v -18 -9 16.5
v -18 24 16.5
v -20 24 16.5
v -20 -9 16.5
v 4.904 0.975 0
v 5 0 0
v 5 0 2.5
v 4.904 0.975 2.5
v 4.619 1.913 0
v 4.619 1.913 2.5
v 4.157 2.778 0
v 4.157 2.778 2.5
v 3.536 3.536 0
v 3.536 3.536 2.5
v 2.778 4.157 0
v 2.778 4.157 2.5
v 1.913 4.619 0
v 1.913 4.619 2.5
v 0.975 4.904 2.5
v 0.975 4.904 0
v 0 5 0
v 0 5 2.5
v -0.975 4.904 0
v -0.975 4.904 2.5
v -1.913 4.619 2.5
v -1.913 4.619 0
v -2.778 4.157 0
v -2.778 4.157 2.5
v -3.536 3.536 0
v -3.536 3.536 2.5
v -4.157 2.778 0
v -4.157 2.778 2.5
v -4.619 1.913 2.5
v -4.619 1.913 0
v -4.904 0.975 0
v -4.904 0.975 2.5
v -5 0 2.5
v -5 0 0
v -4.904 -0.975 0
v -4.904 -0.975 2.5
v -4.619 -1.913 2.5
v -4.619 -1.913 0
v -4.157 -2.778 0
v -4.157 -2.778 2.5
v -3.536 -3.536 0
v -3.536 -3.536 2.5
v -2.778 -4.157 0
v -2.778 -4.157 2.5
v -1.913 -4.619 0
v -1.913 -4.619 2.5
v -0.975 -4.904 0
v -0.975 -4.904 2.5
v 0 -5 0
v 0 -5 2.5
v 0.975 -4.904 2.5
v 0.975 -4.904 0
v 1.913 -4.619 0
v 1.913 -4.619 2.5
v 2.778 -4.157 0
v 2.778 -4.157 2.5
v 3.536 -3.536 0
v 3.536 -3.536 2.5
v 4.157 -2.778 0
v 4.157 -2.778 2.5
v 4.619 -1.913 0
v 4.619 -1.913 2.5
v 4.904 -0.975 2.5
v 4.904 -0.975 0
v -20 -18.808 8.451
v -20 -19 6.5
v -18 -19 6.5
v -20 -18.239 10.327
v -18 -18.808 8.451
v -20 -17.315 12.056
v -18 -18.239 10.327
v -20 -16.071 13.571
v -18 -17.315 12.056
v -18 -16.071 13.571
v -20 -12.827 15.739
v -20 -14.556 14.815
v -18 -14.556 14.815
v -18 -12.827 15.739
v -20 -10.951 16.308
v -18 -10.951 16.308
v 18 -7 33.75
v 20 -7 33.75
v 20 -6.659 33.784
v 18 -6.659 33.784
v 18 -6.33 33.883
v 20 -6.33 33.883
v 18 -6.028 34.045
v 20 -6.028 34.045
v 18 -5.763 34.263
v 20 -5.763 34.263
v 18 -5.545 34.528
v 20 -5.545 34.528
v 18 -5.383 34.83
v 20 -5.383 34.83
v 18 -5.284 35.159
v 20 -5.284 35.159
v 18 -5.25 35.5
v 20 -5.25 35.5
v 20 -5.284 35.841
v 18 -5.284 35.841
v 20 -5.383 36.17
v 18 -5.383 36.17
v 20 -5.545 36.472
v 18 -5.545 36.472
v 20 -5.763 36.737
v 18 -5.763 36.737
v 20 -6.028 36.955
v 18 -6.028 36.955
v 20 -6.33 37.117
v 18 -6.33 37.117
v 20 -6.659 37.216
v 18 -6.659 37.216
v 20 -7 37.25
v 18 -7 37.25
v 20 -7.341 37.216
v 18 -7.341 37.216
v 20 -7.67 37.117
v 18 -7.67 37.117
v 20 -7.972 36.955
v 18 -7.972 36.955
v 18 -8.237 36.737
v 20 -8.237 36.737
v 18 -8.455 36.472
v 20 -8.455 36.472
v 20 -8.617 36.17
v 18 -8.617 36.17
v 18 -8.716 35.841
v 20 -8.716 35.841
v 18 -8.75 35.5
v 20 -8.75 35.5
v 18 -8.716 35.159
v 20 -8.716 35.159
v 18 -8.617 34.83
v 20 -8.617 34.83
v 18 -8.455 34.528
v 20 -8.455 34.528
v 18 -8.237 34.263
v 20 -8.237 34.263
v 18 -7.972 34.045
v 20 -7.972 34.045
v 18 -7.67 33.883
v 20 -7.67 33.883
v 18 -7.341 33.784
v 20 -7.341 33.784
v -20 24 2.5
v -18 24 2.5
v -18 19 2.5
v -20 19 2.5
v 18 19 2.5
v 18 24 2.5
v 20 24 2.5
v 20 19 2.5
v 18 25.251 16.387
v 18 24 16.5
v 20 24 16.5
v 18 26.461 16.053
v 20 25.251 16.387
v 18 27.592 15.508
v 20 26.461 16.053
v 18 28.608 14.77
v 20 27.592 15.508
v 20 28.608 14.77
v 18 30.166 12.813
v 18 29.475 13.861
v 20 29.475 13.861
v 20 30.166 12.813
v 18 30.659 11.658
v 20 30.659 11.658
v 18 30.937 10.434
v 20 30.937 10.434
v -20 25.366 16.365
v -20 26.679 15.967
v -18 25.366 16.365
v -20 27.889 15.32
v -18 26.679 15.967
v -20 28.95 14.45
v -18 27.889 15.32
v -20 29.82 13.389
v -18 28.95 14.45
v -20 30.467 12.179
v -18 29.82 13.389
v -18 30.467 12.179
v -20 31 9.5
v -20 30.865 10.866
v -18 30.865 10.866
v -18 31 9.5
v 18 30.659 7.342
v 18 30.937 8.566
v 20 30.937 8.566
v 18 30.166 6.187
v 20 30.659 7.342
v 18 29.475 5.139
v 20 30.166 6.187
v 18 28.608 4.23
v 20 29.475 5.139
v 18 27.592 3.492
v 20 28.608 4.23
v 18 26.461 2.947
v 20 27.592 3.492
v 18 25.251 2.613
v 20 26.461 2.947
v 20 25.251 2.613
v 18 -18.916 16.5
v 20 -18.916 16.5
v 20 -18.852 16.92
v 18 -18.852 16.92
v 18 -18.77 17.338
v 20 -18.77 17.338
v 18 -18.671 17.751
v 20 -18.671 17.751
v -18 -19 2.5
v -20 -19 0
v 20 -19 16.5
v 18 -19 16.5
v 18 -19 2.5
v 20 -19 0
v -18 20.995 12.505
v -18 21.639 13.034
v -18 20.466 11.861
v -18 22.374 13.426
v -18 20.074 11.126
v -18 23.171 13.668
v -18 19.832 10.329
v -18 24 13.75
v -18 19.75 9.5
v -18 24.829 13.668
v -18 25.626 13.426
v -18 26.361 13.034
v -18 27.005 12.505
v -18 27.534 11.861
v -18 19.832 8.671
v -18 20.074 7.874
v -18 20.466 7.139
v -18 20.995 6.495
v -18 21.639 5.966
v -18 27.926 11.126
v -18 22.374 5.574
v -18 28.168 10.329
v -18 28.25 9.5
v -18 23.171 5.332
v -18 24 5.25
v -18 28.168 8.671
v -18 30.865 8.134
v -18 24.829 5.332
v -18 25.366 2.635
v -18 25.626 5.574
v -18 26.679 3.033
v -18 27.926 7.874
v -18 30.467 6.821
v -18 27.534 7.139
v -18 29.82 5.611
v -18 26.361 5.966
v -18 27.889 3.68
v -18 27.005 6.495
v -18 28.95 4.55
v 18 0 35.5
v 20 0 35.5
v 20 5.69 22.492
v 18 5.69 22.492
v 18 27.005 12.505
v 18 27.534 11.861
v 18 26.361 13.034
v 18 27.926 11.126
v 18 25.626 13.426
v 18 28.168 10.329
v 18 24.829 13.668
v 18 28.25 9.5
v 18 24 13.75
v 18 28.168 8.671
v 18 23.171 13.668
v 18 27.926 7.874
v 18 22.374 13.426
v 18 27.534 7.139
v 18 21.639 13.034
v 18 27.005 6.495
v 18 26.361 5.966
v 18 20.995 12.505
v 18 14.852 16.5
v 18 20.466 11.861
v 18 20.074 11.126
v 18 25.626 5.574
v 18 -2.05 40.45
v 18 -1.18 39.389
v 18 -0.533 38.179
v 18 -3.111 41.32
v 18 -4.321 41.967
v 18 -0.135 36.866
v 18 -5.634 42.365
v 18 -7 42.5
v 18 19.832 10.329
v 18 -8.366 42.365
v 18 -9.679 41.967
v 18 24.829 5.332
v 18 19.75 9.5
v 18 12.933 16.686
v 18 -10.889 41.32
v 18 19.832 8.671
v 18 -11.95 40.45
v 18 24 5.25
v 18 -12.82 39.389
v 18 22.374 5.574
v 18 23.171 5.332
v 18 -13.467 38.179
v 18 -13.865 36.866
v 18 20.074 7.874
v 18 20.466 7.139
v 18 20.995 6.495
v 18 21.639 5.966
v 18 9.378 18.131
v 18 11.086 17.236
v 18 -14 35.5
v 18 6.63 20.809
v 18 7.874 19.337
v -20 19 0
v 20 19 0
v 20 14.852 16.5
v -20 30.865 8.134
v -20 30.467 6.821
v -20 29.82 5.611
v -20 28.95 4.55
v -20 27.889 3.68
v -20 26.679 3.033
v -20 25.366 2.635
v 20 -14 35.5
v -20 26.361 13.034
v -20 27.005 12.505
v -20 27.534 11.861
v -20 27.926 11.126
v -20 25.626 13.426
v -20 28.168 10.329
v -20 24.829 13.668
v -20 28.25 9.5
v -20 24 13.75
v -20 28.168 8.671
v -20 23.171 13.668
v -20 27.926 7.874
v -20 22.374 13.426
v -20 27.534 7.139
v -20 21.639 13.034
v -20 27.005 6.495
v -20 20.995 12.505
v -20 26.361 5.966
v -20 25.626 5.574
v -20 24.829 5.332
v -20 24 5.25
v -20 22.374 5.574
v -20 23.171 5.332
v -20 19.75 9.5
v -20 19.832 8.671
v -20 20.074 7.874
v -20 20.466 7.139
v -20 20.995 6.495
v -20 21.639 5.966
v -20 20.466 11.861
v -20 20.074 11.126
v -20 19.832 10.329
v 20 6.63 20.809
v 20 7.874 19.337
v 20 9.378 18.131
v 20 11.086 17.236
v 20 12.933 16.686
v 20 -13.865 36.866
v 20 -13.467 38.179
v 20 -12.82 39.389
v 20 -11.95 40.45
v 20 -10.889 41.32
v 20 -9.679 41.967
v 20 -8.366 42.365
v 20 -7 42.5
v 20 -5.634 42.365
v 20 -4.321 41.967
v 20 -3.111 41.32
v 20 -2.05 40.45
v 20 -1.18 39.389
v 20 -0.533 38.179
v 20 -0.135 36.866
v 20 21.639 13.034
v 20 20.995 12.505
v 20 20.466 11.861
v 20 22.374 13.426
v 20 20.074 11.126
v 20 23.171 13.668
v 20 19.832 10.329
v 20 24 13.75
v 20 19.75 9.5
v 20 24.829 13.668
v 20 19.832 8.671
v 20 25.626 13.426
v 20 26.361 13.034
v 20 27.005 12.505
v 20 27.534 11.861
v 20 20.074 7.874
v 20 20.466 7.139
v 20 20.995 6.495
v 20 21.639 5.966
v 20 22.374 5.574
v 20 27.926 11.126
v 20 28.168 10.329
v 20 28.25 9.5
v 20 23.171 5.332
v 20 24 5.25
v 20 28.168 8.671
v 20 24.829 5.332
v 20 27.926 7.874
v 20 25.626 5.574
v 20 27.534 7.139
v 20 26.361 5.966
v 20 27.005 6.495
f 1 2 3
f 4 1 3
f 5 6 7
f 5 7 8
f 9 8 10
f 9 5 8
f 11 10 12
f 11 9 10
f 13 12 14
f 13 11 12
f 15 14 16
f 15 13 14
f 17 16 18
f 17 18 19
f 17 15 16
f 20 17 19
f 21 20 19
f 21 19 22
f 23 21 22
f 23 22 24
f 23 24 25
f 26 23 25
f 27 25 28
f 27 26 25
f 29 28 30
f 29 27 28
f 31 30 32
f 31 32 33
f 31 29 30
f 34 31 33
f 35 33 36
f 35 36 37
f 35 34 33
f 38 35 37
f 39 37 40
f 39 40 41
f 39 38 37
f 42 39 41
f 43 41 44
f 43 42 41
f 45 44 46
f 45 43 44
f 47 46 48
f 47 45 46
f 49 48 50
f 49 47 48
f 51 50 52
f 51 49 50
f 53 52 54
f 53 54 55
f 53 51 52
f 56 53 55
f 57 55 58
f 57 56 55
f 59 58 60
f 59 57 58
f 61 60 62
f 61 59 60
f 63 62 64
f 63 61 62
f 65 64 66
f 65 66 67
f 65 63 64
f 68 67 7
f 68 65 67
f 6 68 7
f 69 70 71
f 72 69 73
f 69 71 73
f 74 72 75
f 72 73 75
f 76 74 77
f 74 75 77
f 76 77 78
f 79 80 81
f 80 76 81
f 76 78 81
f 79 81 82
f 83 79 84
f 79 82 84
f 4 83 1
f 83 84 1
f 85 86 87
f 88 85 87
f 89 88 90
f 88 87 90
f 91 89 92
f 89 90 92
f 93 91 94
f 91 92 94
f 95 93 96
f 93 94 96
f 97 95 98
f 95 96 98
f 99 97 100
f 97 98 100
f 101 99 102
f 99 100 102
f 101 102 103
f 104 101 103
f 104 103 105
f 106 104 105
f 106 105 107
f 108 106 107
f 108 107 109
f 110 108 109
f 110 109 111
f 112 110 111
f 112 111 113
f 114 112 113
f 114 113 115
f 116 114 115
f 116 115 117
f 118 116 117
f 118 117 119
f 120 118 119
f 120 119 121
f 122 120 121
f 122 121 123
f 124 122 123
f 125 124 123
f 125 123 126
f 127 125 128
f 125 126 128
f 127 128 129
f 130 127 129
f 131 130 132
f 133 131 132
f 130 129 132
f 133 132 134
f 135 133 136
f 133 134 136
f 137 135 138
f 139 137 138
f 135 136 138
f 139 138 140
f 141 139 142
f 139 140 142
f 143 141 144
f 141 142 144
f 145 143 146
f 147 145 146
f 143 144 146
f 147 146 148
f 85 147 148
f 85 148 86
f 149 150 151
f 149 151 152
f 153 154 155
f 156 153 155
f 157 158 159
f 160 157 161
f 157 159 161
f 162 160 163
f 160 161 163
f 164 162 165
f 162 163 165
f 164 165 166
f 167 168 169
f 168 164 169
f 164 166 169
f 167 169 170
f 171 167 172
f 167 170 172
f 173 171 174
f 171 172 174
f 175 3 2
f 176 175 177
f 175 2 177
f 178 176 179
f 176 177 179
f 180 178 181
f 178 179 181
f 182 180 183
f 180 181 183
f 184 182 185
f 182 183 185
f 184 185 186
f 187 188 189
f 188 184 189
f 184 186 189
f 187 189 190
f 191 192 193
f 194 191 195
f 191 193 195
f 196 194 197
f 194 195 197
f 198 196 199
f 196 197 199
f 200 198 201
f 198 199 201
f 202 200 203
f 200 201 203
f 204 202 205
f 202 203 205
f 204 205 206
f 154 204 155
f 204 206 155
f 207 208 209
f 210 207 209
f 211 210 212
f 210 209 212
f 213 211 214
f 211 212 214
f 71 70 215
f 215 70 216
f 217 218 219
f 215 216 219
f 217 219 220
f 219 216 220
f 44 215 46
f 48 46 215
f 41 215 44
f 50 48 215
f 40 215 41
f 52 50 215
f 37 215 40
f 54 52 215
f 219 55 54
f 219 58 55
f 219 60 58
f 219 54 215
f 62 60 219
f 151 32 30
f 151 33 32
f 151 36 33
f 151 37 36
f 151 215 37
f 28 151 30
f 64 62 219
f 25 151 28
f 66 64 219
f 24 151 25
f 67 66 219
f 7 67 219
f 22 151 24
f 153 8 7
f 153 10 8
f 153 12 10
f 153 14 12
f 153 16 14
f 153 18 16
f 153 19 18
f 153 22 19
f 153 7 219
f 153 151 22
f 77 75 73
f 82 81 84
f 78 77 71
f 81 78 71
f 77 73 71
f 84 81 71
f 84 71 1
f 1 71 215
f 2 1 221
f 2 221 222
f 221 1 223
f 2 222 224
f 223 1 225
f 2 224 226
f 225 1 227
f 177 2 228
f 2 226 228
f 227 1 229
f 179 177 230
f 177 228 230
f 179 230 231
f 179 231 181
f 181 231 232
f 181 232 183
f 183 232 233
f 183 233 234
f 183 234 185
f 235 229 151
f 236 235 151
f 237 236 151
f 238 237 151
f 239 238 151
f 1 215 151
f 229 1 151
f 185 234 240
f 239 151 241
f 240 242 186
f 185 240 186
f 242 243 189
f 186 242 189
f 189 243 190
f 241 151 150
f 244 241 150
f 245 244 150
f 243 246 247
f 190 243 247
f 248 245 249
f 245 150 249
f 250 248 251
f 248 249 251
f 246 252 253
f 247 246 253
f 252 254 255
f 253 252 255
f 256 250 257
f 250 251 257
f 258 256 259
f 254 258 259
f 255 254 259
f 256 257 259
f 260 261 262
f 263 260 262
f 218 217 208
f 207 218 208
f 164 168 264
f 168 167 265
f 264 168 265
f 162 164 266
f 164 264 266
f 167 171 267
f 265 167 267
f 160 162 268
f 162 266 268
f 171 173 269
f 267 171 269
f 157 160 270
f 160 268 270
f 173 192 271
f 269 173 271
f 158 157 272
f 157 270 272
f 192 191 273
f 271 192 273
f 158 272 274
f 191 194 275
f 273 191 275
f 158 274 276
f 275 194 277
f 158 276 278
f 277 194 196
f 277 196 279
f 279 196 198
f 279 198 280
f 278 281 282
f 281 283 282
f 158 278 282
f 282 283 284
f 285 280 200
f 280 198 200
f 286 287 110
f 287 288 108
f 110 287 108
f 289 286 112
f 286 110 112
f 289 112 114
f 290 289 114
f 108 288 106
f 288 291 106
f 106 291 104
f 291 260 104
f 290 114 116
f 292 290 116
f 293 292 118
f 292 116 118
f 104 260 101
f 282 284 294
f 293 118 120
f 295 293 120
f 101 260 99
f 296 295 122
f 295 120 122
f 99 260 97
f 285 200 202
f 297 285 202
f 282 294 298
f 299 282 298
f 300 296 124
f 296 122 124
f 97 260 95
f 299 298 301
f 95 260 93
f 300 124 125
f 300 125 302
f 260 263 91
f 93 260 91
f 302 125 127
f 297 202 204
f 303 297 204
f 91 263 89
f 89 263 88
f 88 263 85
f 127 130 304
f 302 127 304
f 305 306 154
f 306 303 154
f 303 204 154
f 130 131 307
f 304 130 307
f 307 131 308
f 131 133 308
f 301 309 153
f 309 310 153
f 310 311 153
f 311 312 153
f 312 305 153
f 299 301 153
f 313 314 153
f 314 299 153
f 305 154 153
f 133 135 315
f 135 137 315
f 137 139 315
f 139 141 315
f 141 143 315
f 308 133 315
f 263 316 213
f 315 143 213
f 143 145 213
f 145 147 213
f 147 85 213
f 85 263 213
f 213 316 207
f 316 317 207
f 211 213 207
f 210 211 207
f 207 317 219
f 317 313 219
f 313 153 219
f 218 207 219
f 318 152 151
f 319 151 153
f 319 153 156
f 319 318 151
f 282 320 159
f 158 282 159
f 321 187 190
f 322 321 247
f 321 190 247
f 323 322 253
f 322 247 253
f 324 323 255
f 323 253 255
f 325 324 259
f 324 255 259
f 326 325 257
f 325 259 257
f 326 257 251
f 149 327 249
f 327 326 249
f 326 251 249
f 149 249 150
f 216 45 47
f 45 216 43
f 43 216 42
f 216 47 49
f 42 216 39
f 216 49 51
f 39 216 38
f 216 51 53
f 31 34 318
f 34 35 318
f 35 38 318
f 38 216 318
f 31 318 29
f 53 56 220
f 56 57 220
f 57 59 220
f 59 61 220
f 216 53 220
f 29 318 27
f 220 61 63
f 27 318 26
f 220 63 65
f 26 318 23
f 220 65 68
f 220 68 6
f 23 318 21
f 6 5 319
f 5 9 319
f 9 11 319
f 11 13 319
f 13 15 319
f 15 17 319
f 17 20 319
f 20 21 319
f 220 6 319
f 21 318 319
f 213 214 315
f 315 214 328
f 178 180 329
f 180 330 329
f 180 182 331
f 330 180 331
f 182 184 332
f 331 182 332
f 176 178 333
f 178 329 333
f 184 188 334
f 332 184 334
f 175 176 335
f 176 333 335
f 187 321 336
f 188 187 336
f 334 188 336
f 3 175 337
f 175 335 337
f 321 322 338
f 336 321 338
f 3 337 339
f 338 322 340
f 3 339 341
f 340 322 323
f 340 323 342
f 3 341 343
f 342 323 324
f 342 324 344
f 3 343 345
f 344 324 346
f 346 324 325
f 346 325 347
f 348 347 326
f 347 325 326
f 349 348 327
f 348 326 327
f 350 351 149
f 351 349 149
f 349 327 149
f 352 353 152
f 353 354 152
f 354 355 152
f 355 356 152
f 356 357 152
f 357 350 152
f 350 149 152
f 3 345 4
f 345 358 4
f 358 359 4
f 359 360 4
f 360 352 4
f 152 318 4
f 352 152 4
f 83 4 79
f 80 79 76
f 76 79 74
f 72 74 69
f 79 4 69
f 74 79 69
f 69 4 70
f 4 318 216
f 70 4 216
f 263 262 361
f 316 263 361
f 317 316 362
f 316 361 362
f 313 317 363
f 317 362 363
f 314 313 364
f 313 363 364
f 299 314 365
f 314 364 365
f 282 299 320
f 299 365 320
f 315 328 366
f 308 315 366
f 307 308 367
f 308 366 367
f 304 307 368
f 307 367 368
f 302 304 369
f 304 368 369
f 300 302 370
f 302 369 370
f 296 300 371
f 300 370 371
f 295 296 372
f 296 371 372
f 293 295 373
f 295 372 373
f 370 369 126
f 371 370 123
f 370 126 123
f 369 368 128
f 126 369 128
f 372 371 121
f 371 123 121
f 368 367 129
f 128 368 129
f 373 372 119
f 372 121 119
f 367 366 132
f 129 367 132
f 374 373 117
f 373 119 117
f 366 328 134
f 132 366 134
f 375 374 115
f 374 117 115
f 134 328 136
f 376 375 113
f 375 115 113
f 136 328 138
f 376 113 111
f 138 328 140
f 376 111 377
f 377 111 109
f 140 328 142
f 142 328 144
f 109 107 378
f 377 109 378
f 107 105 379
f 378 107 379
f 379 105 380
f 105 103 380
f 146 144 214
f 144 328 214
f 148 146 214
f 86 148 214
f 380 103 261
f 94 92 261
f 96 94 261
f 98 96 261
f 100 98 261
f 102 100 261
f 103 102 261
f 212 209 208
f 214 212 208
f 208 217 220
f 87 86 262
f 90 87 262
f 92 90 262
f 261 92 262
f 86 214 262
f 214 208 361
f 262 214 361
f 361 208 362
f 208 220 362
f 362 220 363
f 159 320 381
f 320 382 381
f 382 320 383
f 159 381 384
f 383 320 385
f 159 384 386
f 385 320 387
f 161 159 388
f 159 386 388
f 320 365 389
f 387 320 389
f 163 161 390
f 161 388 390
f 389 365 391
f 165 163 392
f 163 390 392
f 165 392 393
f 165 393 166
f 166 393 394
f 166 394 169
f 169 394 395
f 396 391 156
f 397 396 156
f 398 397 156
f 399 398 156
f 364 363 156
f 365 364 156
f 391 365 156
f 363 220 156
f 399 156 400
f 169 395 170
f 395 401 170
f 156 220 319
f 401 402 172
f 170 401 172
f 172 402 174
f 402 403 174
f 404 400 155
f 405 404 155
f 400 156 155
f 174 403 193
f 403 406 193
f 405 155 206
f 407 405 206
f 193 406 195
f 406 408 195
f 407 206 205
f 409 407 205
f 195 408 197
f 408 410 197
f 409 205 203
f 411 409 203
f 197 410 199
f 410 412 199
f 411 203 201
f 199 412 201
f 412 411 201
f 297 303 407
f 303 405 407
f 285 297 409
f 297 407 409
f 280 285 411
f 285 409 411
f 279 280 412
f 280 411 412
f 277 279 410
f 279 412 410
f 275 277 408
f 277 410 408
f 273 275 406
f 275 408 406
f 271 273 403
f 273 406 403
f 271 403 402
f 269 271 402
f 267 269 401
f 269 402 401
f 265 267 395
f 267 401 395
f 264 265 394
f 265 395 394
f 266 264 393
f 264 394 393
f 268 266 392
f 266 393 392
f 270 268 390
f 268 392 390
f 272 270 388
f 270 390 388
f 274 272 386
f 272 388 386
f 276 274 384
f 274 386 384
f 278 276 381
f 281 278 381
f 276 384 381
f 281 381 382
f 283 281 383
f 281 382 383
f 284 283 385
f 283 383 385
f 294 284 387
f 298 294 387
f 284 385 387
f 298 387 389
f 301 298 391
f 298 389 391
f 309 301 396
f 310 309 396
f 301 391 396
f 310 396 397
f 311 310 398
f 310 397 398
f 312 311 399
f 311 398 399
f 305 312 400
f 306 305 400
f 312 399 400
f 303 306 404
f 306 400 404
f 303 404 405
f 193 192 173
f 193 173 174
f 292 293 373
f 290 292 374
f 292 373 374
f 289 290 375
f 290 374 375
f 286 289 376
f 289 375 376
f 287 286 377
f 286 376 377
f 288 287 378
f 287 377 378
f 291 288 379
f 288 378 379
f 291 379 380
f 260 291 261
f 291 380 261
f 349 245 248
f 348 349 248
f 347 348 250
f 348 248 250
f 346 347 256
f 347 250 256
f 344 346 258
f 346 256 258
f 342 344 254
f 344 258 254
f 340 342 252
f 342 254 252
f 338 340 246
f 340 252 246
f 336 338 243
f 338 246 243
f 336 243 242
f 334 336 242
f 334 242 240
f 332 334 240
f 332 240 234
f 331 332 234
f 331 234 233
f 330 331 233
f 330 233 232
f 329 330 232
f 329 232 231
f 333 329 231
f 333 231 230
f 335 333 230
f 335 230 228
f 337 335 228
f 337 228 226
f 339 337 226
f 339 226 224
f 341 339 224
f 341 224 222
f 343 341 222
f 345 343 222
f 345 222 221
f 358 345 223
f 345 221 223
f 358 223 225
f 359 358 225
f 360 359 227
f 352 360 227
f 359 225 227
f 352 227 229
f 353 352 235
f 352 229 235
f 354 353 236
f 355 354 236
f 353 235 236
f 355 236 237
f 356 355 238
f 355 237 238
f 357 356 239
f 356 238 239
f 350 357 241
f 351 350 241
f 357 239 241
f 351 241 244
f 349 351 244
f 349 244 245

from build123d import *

# Parameters (mm, degrees)
SKETCH_1_W          = 40
SKETCH_1_H          = 38
SKETCH_1_R          = 5
EXTRUDE_1_DEPTH     = 2.5
EXTRUDE_2_DEPTH     = 14
SKETCH_3_R          = 4.25
CUT_EXTRUDE_2_DEPTH = 3
SKETCH_4_W          = 2
SKETCH_4_H          = 11.937460889
SKETCH_4_H_2        = 38
EXTRUDE_3_DEPTH     = 40
CUT_EXTRUDE_3_REACH = 42
SKETCH_5_R          = 1.75
SKETCH_5_R_2        = 4.25


with BuildPart() as part:
    # 草图1 → 凸台-拉伸1 (new body)
    with BuildSketch(Plane.XY):
        Rectangle(SKETCH_1_W, SKETCH_1_H)
        Circle(SKETCH_1_R, mode=Mode.SUBTRACT)
    extrude(amount=EXTRUDE_1_DEPTH)

    # 草图2 → 凸台-拉伸2 (add)
    with BuildSketch(Plane.XY.offset(2.5)):
        Polygon((-18, 19), (-18, -19), (-20, -19), (-20, 19), (-20, 31), (-18, 31), align=None)
    extrude(amount=EXTRUDE_2_DEPTH)

    # 草图3 → 切除-拉伸2 (cut, through all)
    with BuildSketch(Plane(origin=(-18, 0, 0), x_dir=(0, 0, -1), z_dir=(1, 0, 0))):
        with BuildLine():
            Line((-16.5, -19), (-6.5, -19))
            ThreePointArc((-6.5, -19), (-13.571067812, -16.071067812), (-16.5, -9))
            Line((-16.5, -9), (-16.5, -19))
        make_face()
        with BuildLine():
            Line((-16.5, 31), (-16.5, 24))
            ThreePointArc((-16.5, 24), (-14.449747468, 28.949747468), (-9.5, 31))
            Line((-9.5, 31), (-16.5, 31))
        make_face()
        with BuildLine():
            ThreePointArc((-9.5, 31), (-4.550252532, 28.949747468), (-2.5, 24))
            Line((-2.5, 24), (-2.5, 31))
            Line((-2.5, 31), (-9.5, 31))
        make_face()
        with Locations((-9.5, 24)):
            Circle(SKETCH_3_R)
    extrude(amount=-CUT_EXTRUDE_2_DEPTH, mode=Mode.SUBTRACT)

    # 草图4 → 凸台-拉伸3 (add)
    with BuildSketch(Plane.XY.offset(2.5)):
        with Locations((19, 24.968730445)):
            Rectangle(SKETCH_4_W, SKETCH_4_H)
        with Locations((19, 0)):
            Rectangle(SKETCH_4_W, SKETCH_4_H_2)
    extrude(amount=EXTRUDE_3_DEPTH)

    # 草图5 → 切除-拉伸3 (cut, up to next)
    with BuildSketch(Plane(origin=(20, 0, 0), x_dir=(0, 0, -1), z_dir=(1, 0, 0)), mode=Mode.PRIVATE) as cut_extrude_3_sk1:
        with BuildLine():
            ThreePointArc((-35.5, -14), (-40.449747452, -11.949747484), (-42.5, -7.000000045))
            Line((-42.5, -7.000000045), (-42.5, -19))
            Line((-42.5, -19), (-16.5, -19))
            Line((-16.5, -19), (-16.5, -18.915955378))
            ThreePointArc((-16.5, -18.915955378), (-17.129495713, -18.813310688), (-17.751167584, -18.670745373))
            Line((-17.751167584, -18.670745373), (-35.5, -14))
        make_face()
    cut_extrude_3_tool1 = extrude(cut_extrude_3_sk1.sketch, amount=-CUT_EXTRUDE_3_REACH, mode=Mode.PRIVATE) & part.part
    add(cut_extrude_3_tool1.solids().sort_by_distance((20, -16.467085, 34.190758))[0], mode=Mode.SUBTRACT)
    # 草图5 → 切除-拉伸3 (cut, up to next)
    with BuildSketch(Plane(origin=(20, 0, 0), x_dir=(0, 0, -1), z_dir=(1, 0, 0)), mode=Mode.PRIVATE) as cut_extrude_3_sk2:
        with BuildLine():
            ThreePointArc((-16.5, 24), (-14.769502014, 28.60785726), (-10.433614706, 30.937460889))
            Line((-10.433614706, 30.937460889), (-42.5, 30.937460889))
            Line((-42.5, 30.937460889), (-42.5, -7.000000045))
            ThreePointArc((-42.5, -7.000000045), (-40.449747484, -2.050252548), (-35.5, 0))
            Line((-35.5, 0), (-22.492126933, 5.690411164))
            ThreePointArc((-22.492126933, 5.690411164), (-18.131047537, 9.37849159), (-16.5, 14.852122439))
            Line((-16.5, 14.852122439), (-16.5, 24))
        make_face()
    cut_extrude_3_tool2 = extrude(cut_extrude_3_sk2.sketch, amount=-CUT_EXTRUDE_3_REACH, mode=Mode.PRIVATE) & part.part
    add(cut_extrude_3_tool2.solids().sort_by_distance((20, 16.838407, 30.295804))[0], mode=Mode.SUBTRACT)
    # 草图5 → 切除-拉伸3 (cut, up to next)
    with BuildSketch(Plane(origin=(20, 0, 0), x_dir=(0, 0, -1), z_dir=(1, 0, 0)), mode=Mode.PRIVATE) as cut_extrude_3_sk3:
        with BuildLine():
            Line((-2.5, 24), (-2.5, 25))
            Line((-2.5, 25), (-2.5, 30.937460889))
            Line((-2.5, 30.937460889), (-8.566385294, 30.937460889))
            ThreePointArc((-8.566385294, 30.937460889), (-4.230497986, 28.60785726), (-2.5, 24))
        make_face()
    cut_extrude_3_tool3 = extrude(cut_extrude_3_sk3.sketch, amount=-CUT_EXTRUDE_3_REACH, mode=Mode.PRIVATE) & part.part
    add(cut_extrude_3_tool3.solids().sort_by_distance((20, 29.375995, 3.999369))[0], mode=Mode.SUBTRACT)
    # 草图5 → 切除-拉伸3 (cut, up to next)
    with BuildSketch(Plane(origin=(20, 0, 0), x_dir=(0, 0, -1), z_dir=(1, 0, 0)), mode=Mode.PRIVATE) as cut_extrude_3_sk4:
        with Locations((-35.5, -7)):
            Circle(SKETCH_5_R)
    cut_extrude_3_tool4 = extrude(cut_extrude_3_sk4.sketch, amount=-CUT_EXTRUDE_3_REACH, mode=Mode.PRIVATE) & part.part
    add(cut_extrude_3_tool4.solids().sort_by_distance((20, -7, 35.5))[0], mode=Mode.SUBTRACT)
    # 草图5 → 切除-拉伸3 (cut, up to next)
    with BuildSketch(Plane(origin=(20, 0, 0), x_dir=(0, 0, -1), z_dir=(1, 0, 0)), mode=Mode.PRIVATE) as cut_extrude_3_sk5:
        with Locations((-9.5, 24)):
            Circle(SKETCH_5_R_2)
    cut_extrude_3_tool5 = extrude(cut_extrude_3_sk5.sketch, amount=-CUT_EXTRUDE_3_REACH, mode=Mode.PRIVATE) & part.part
    add(cut_extrude_3_tool5.solids().sort_by_distance((20, 24, 9.5))[0], mode=Mode.SUBTRACT)


solid = part.part
